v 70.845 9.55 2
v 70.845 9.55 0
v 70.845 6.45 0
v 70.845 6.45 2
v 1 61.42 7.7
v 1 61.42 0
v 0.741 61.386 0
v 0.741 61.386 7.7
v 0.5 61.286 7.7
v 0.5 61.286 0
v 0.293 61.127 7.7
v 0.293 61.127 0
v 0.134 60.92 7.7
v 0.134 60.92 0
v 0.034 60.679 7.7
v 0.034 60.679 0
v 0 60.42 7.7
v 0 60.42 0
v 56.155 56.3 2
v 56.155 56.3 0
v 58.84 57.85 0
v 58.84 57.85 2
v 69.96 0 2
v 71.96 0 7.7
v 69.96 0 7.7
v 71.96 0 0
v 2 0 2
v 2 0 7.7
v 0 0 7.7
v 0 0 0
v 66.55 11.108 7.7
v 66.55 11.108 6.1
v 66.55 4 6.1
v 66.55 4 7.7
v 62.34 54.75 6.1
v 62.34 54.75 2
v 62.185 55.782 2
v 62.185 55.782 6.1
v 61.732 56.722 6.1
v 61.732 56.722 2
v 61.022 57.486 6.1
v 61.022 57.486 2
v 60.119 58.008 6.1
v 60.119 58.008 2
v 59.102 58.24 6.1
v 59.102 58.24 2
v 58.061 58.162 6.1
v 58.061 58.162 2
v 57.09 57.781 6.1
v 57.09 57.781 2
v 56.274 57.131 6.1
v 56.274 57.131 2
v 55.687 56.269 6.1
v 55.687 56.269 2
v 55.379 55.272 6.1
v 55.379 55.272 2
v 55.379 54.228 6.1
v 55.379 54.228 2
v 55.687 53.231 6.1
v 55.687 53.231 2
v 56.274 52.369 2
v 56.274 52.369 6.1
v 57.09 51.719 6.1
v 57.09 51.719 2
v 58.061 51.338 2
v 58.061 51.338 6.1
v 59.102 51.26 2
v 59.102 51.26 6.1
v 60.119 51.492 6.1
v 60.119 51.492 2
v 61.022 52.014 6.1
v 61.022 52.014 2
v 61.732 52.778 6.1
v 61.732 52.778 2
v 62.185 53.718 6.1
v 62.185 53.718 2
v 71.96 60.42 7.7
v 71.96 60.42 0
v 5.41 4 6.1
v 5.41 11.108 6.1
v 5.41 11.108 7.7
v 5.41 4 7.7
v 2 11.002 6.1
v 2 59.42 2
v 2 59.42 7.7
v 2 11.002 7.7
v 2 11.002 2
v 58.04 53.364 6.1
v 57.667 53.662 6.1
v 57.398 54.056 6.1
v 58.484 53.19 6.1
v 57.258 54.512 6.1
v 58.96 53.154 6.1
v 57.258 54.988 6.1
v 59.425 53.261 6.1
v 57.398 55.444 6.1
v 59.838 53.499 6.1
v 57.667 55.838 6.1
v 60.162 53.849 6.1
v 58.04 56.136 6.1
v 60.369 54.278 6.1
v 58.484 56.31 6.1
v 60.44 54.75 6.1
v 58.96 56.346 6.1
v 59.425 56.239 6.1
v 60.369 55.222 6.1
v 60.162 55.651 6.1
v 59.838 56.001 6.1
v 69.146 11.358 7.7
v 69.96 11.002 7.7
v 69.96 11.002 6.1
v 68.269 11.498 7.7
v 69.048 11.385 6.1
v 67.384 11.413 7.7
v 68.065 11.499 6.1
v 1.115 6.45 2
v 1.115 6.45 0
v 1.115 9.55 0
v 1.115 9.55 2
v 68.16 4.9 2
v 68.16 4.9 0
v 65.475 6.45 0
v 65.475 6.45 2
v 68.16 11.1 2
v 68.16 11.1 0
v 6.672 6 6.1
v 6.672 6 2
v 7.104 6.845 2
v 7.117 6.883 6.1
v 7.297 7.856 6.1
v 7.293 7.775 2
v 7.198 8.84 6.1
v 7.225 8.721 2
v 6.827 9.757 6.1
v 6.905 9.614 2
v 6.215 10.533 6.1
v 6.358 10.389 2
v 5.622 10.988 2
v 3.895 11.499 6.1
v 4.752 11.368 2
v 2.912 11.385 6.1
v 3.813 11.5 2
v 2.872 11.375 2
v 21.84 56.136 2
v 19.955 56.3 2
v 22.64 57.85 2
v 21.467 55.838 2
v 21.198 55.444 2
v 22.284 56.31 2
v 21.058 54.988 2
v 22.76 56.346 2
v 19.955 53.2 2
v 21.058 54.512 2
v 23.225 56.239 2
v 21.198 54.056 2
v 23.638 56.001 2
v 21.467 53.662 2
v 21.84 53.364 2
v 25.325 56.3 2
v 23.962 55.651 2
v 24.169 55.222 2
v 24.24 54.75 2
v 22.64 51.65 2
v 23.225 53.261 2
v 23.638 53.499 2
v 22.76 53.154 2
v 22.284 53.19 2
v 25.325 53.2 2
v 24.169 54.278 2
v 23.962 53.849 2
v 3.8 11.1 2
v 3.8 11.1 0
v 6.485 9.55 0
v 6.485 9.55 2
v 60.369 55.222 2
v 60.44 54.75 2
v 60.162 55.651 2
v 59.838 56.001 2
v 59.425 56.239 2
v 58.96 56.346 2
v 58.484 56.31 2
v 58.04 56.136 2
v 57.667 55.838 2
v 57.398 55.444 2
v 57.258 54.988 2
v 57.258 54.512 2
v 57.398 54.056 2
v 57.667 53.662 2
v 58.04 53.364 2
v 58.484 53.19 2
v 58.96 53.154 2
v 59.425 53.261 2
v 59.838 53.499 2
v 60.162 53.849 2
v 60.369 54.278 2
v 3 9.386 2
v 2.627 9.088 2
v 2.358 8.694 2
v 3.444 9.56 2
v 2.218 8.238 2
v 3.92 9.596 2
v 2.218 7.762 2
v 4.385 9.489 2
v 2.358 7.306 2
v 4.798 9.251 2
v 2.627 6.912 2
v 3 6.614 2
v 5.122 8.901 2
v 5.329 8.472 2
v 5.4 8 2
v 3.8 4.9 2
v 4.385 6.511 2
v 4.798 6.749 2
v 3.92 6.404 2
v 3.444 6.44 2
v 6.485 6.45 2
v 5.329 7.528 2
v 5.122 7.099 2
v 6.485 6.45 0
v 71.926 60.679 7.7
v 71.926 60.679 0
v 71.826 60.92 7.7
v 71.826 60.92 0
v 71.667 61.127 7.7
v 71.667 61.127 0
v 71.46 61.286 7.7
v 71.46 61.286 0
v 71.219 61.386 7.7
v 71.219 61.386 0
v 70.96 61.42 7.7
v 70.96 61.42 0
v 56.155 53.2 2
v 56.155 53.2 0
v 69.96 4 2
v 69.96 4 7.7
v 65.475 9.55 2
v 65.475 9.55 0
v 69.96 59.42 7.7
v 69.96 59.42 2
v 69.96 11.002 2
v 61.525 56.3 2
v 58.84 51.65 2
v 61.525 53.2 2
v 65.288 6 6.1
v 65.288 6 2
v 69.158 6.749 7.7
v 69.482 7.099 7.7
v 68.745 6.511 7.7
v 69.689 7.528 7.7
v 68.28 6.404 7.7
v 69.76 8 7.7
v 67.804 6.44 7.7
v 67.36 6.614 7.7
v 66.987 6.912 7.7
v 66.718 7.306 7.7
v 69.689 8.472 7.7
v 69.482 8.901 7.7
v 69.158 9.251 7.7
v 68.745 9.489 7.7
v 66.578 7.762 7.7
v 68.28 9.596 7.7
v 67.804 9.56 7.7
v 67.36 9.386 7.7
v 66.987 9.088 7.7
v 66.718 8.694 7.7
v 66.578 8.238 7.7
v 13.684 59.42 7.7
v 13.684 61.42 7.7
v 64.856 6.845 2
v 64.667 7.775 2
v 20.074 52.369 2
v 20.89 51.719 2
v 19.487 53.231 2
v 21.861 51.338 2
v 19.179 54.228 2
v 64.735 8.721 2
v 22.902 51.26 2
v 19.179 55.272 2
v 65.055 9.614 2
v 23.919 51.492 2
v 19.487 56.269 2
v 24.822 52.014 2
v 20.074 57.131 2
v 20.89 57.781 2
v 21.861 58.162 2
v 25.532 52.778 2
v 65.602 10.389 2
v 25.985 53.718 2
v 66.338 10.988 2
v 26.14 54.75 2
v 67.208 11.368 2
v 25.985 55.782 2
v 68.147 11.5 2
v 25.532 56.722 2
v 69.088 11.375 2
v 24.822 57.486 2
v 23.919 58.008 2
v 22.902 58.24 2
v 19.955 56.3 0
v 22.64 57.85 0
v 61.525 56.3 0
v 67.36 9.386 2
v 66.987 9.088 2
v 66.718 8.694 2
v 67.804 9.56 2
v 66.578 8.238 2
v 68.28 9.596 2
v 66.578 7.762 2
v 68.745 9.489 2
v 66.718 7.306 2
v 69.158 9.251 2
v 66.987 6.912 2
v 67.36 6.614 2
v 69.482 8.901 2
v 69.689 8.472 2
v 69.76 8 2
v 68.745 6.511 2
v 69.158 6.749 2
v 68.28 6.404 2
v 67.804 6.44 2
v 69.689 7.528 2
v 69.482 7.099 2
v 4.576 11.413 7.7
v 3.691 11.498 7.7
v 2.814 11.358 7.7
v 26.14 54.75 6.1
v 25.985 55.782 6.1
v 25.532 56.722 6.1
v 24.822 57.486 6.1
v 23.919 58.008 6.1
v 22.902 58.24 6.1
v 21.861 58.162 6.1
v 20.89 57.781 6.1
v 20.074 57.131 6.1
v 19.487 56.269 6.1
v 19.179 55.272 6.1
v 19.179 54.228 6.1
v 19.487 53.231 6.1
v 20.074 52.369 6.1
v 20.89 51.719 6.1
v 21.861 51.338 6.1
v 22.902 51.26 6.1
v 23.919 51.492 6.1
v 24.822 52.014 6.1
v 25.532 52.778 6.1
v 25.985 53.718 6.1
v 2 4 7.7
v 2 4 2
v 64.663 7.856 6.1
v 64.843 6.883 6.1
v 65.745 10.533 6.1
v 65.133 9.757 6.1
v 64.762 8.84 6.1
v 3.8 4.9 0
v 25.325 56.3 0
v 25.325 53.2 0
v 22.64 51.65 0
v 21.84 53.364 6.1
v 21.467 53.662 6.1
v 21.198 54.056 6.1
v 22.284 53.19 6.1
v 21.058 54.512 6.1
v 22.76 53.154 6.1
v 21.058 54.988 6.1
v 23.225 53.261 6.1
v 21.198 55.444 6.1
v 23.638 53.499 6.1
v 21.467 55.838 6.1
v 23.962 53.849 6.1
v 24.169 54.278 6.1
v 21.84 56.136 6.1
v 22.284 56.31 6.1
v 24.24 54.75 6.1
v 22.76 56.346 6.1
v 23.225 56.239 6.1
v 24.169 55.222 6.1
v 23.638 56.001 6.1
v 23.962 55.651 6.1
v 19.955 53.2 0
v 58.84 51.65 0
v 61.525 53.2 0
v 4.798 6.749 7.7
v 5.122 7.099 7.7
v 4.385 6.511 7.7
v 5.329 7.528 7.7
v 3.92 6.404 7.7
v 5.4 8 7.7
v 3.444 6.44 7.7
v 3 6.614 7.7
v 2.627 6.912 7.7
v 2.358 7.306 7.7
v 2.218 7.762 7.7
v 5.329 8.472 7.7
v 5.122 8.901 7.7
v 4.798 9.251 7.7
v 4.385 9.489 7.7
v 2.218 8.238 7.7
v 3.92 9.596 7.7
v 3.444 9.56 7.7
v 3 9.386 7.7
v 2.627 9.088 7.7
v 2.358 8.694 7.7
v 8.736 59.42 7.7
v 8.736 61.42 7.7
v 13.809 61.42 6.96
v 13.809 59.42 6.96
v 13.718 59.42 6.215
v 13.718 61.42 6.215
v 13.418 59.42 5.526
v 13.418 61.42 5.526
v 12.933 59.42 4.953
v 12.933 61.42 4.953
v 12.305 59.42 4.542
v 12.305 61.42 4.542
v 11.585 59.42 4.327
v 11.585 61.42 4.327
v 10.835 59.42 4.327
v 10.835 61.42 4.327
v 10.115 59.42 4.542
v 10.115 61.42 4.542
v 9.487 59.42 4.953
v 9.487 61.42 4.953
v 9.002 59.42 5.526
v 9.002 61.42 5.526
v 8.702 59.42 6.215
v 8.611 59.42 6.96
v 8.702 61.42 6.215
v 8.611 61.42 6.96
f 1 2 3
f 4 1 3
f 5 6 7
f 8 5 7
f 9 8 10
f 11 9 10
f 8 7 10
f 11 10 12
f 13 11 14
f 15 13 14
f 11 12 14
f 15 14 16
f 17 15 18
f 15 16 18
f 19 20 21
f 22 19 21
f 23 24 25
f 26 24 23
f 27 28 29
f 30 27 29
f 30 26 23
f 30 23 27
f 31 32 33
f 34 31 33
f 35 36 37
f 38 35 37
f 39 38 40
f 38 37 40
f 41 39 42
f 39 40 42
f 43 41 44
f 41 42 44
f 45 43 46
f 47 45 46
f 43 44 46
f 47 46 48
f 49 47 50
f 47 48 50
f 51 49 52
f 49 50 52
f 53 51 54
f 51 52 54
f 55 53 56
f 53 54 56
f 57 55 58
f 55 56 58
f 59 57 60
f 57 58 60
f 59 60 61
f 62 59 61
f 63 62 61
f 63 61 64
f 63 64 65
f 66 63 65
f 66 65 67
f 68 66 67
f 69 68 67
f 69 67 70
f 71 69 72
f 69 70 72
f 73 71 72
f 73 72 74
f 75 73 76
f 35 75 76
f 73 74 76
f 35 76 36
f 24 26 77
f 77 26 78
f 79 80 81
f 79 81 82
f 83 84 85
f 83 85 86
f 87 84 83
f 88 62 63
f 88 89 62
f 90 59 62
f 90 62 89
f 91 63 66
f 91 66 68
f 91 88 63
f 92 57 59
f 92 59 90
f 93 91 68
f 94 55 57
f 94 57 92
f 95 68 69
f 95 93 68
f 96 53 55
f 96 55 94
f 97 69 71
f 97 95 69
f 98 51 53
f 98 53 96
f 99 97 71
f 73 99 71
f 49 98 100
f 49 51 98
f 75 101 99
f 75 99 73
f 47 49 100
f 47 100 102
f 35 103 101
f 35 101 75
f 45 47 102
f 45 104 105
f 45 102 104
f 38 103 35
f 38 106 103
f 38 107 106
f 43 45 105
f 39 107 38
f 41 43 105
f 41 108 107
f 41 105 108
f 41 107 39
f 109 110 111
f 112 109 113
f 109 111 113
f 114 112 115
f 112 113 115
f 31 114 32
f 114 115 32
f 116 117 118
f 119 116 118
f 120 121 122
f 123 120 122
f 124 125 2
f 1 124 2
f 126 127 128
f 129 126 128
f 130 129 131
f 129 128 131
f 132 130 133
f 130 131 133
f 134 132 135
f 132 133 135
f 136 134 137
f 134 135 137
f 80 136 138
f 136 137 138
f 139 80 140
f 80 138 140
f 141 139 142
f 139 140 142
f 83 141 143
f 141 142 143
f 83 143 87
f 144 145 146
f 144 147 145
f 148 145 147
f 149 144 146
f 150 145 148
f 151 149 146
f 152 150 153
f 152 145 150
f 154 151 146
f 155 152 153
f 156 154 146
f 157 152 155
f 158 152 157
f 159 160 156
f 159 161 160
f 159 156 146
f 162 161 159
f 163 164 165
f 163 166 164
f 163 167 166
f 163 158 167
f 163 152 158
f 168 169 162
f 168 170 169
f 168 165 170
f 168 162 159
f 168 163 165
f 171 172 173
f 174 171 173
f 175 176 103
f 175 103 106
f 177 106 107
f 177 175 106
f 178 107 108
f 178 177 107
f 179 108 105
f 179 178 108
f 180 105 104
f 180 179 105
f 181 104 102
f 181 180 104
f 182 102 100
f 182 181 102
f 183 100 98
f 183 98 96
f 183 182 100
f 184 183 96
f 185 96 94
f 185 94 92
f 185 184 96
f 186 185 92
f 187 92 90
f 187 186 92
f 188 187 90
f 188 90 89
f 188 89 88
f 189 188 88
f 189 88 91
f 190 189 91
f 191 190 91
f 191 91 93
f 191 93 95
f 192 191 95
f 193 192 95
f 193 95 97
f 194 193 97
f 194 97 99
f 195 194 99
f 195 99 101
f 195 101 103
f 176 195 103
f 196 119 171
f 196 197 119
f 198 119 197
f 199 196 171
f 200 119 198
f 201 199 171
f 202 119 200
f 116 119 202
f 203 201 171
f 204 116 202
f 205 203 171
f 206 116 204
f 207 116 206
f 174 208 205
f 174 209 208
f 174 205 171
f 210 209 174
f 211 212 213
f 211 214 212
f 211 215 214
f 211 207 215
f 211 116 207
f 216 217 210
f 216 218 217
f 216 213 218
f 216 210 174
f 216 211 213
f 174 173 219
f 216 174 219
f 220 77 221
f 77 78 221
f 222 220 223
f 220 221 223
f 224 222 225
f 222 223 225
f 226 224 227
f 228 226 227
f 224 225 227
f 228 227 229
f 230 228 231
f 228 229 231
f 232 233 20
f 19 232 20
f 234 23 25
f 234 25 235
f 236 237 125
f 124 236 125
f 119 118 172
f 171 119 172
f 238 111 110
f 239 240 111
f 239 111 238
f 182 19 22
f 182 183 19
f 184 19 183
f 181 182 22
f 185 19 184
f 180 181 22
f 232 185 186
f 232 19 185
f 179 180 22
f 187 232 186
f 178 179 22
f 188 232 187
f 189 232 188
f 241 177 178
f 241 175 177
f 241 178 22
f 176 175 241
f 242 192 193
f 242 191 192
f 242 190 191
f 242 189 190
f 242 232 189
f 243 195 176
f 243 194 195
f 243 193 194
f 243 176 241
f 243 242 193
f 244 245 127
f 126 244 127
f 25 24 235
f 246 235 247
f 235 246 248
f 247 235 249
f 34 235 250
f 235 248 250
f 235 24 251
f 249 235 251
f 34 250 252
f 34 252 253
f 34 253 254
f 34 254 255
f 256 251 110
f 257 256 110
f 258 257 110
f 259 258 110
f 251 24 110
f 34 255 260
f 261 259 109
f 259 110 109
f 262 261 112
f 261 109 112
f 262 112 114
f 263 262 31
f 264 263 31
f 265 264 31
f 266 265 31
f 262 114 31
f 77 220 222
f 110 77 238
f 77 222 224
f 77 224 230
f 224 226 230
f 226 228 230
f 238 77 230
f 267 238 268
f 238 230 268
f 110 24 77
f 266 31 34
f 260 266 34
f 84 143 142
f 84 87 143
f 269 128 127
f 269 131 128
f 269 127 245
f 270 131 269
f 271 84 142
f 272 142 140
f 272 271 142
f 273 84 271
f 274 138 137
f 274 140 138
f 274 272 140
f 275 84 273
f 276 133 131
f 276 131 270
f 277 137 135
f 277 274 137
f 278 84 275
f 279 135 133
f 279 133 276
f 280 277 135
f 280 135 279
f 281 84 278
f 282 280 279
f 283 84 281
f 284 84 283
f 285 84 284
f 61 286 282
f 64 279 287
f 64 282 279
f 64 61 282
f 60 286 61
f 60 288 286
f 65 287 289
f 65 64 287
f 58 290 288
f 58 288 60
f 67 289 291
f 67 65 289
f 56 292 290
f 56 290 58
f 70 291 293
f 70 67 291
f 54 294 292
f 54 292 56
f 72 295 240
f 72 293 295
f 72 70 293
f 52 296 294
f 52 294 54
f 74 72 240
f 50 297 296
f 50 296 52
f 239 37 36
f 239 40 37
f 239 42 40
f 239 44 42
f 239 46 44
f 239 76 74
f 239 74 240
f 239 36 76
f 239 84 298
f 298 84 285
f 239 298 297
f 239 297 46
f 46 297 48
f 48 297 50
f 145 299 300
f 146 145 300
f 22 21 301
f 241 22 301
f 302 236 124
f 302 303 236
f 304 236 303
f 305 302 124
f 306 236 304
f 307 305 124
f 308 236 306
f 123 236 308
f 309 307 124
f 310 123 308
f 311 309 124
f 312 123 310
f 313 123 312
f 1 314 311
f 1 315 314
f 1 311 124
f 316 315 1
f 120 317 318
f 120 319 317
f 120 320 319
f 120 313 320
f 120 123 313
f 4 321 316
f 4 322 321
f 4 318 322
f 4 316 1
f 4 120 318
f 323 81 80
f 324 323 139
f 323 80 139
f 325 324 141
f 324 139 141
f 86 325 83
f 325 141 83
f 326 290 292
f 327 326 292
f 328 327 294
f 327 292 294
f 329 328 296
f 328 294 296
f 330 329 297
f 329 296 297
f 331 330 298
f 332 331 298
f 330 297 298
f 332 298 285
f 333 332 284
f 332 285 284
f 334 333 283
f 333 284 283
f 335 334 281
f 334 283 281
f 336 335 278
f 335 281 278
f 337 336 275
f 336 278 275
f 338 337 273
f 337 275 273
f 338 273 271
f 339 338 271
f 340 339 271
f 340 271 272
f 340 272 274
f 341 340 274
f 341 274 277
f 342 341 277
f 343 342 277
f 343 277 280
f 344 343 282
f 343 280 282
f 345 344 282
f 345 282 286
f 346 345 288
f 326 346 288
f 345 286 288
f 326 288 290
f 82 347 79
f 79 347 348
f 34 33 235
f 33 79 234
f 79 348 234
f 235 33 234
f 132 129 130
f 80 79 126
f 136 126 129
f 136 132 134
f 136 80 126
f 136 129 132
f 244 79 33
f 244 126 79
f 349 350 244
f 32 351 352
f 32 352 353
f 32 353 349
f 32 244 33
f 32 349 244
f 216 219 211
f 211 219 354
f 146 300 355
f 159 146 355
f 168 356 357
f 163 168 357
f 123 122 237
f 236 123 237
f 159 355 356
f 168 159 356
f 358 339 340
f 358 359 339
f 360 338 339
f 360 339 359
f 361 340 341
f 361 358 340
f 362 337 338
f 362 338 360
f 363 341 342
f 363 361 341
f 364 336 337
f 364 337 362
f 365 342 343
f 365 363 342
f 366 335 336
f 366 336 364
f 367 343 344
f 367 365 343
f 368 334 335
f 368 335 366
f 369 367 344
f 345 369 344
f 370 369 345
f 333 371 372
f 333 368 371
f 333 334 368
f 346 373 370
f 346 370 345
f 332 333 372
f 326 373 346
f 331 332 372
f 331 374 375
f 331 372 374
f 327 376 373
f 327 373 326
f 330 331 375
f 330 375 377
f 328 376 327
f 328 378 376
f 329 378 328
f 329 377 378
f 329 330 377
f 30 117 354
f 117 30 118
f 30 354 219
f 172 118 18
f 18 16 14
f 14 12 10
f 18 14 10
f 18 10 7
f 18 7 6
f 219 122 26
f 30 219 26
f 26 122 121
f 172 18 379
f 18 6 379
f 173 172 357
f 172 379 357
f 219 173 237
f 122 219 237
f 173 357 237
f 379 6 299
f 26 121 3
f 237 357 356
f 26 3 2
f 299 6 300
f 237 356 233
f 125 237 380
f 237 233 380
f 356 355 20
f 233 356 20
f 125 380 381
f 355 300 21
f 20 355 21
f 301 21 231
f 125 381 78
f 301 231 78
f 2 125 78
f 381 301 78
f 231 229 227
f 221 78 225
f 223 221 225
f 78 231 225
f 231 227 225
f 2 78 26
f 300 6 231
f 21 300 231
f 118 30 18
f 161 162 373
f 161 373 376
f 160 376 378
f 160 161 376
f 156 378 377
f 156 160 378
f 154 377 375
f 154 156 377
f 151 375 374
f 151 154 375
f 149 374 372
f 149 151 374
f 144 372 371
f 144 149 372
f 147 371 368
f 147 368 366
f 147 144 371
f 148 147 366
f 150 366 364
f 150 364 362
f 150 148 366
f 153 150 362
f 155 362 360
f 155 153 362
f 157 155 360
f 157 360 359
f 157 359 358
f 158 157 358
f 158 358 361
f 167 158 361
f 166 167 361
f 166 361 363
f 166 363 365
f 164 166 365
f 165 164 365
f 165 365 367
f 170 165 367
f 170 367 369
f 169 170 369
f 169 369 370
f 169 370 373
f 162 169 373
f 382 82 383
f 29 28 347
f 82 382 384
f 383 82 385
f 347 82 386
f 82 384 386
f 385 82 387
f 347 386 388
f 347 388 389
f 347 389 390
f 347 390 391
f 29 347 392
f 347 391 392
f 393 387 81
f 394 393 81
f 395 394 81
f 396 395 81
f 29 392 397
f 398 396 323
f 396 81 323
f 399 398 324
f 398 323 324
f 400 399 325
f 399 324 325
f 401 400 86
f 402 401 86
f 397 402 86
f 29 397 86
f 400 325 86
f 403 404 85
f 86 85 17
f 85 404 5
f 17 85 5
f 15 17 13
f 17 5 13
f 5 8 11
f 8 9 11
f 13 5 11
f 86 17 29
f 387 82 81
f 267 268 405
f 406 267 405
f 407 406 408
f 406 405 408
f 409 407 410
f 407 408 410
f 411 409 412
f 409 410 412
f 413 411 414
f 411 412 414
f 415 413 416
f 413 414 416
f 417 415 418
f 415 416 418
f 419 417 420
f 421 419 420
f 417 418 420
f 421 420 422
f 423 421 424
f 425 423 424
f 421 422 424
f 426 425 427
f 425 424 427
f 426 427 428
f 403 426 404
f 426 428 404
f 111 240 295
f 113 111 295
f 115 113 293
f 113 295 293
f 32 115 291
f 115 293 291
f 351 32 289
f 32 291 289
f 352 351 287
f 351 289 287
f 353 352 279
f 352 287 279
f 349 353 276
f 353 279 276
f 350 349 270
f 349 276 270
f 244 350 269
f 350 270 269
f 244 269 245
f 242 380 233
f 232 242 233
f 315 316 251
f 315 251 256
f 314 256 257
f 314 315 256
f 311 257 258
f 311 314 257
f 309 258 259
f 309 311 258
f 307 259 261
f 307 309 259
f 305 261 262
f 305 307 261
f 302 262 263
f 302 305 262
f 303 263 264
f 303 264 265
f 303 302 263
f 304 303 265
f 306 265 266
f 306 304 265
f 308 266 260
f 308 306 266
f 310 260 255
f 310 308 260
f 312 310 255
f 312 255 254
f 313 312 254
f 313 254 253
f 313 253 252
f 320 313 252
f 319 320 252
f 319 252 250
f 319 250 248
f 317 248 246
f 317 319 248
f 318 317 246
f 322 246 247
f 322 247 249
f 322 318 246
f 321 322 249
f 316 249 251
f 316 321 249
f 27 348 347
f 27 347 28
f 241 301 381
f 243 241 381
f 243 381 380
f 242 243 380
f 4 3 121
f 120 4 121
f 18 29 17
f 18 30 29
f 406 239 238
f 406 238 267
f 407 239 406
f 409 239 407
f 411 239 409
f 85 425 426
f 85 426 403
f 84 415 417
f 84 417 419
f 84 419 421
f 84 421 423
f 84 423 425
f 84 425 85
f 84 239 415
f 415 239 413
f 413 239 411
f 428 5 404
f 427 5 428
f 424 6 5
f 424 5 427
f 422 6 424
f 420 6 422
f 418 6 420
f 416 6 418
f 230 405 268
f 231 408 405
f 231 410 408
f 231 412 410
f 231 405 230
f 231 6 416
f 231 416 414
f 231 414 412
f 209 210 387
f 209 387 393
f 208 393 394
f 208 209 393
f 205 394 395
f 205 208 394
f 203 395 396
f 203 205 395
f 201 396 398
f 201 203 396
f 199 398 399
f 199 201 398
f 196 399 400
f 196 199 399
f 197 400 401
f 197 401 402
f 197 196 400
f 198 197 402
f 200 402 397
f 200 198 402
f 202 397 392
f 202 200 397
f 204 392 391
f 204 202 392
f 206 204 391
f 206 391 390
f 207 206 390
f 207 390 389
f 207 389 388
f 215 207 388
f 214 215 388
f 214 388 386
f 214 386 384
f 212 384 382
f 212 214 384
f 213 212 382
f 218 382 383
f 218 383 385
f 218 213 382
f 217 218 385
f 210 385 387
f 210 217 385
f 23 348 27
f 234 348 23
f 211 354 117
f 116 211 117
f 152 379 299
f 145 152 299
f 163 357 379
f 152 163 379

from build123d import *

# Parameters (mm, degrees)
EXTRUDE013_DEPTH = 2
SKETCH002_R      = 3.5
SKETCH002_R_2    = 1.6
EXTRUDE002_DEPTH = 4.1
SKETCH003_R      = 1.6
EXTRUDE003_DEPTH = 1.6
EXTRUDE008_DEPTH = 4
EXTRUDE001_DEPTH = 5.7
SKETCH_R         = 1.6
EXTRUDE_DEPTH    = 2


with BuildPart() as extrude013:
    # Sketch013 (on Face1 of Fusion) → Extrude013 (new body)
    with BuildSketch(Plane(origin=(0, 0, 0), x_dir=(1, 0, 0), z_dir=(0, 0, -1))):
        Polygon((6.484679, -9.55), (6.484679, -6.45), (3.8, -4.9), (1.115321, -6.45), (1.115321, -9.55), (3.8, -11.1), align=None)
        Polygon((68.16, -11.1), (70.844679, -9.55), (70.844679, -6.45), (68.16, -4.9), (65.475321, -6.45), (65.475321, -9.55), align=None)
        Polygon((61.524679, -53.2), (58.84, -51.65), (56.155321, -53.2), (56.155321, -56.3), (58.84, -57.85), (61.524679, -56.3), align=None)
        Polygon((25.324679, -53.2), (22.64, -51.65), (19.955321, -53.2), (19.955321, -56.3), (22.64, -57.85), (25.324679, -56.3), align=None)
    extrude(amount=-EXTRUDE013_DEPTH)


with BuildPart() as extrude002:
    # Sketch002 (on Face12 of Extrude) → Extrude002 (new body)
    with BuildSketch(Plane.XY.offset(2)):
        with Locations((22.64, 54.75)):
            Circle(SKETCH002_R)
        with Locations((22.64, 54.75)):
            Circle(SKETCH002_R_2, mode=Mode.SUBTRACT)
        with Locations((58.84, 54.75)):
            Circle(SKETCH002_R)
        with Locations((58.84, 54.75)):
            Circle(SKETCH002_R_2, mode=Mode.SUBTRACT)
        with BuildLine():
            ThreePointArc((6.672281, 6), (6.357658, 10.389223), (2, 11.001666))
            Line((2, 4), (2, 11.001666))
            Line((2, 4), (69.96, 4))
            Line((69.96, 4), (69.96, 11.001666))
            ThreePointArc((69.96, 11.001666), (65.602342, 10.389223), (65.287719, 6))
            Line((65.287719, 6), (6.672281, 6))
        make_face()
        with Locations((3.8, 8)):
            Circle(SKETCH002_R_2, mode=Mode.SUBTRACT)
        with Locations((68.16, 8)):
            Circle(SKETCH002_R_2, mode=Mode.SUBTRACT)
    extrude(amount=EXTRUDE002_DEPTH)


with BuildPart() as extrude003:
    # Sketch003 (on Face10 of Extrude002) → Extrude003 (new body)
    with BuildSketch(Plane.XY.offset(6.1)):
        with BuildLine():
            Line((66.55, 4), (69.96, 4))
            Line((69.96, 4), (69.96, 11.001666))
            ThreePointArc((69.96, 11.001666), (68.268796, 11.498309), (66.55, 11.107716))
            Line((66.55, 11.107716), (66.55, 4))
        make_face()
        with Locations((68.16, 8)):
            Circle(SKETCH003_R, mode=Mode.SUBTRACT)
        with BuildLine():
            ThreePointArc((5.41, 11.107716), (3.691204, 11.498309), (2, 11.001666))
            Line((2, 11.001666), (2, 4))
            Line((2, 4), (5.41, 4))
            Line((5.41, 11.107716), (5.41, 4))
        make_face()
        with Locations((3.8, 8)):
            Circle(SKETCH003_R, mode=Mode.SUBTRACT)
    extrude(amount=EXTRUDE003_DEPTH)


with BuildPart() as extrude008:
    # Sketch008 (on Face9 of Extrude001) → Extrude008 (new body)
    with BuildSketch(Plane(origin=(0, 61.42, 0), x_dir=(-1, 0, 0), z_dir=(0, 1, 0))):
        with BuildLine():
            ThreePointArc((-13.683863, 7.7), (-11.21, 4.3), (-8.736137, 7.7))
            Line((-13.683863, 7.7), (-8.736137, 7.7))
        make_face()
    extrude(amount=-EXTRUDE008_DEPTH)


with BuildPart() as cut:
    # Sketch001 (on Face12 of Extrude) → Extrude001 (new body)
    with BuildSketch(Plane.XY.offset(2)):
        with BuildLine():
            Line((0, 0), (0, 60.42))
            ThreePointArc((1, 61.42), (0.292893, 61.127107), (0, 60.42))
            Line((1, 61.42), (70.96, 61.42))
            ThreePointArc((71.96, 60.42), (71.667107, 61.127107), (70.96, 61.42))
            Line((71.96, 60.42), (71.96, 0))
            Line((71.96, 0), (69.96, 0))
            Line((69.96, 0), (69.96, 59.42))
            Line((69.96, 59.42), (2, 59.42))
            Line((2, 59.42), (2, 0))
            Line((2, 0), (0, 0))
        make_face()
    extrude(amount=EXTRUDE001_DEPTH)

    # Cut: cut Extrude008
    add(extrude008.part, mode=Mode.SUBTRACT)


with BuildPart() as cut005:
    # Sketch → Extrude (new body)
    with BuildSketch(Plane.XY):
        with BuildLine():
            Line((0, 0), (71.96, 0))
            Line((71.96, 0), (71.96, 60.42))
            ThreePointArc((71.96, 60.42), (71.667107, 61.127107), (70.96, 61.42))
            Line((70.96, 61.42), (1, 61.42))
            ThreePointArc((1, 61.42), (0.292893, 61.127107), (0, 60.42))
            Line((0, 60.42), (0, 0))
        make_face()
        with Locations((22.64, 54.75)):
            Circle(SKETCH_R, mode=Mode.SUBTRACT)
        with Locations((58.84, 54.75)):
            Circle(SKETCH_R, mode=Mode.SUBTRACT)
        with Locations((3.8, 8)):
            Circle(SKETCH_R, mode=Mode.SUBTRACT)
        with Locations((68.16, 8)):
            Circle(SKETCH_R, mode=Mode.SUBTRACT)
    extrude(amount=EXTRUDE_DEPTH)

    # Fusion: union Extrude002, Extrude003, Cut
    add(extrude002.part)
    add(extrude003.part)
    add(cut.part)

    # Cut005: cut Extrude013
    add(extrude013.part, mode=Mode.SUBTRACT)


solid = cut005.part
